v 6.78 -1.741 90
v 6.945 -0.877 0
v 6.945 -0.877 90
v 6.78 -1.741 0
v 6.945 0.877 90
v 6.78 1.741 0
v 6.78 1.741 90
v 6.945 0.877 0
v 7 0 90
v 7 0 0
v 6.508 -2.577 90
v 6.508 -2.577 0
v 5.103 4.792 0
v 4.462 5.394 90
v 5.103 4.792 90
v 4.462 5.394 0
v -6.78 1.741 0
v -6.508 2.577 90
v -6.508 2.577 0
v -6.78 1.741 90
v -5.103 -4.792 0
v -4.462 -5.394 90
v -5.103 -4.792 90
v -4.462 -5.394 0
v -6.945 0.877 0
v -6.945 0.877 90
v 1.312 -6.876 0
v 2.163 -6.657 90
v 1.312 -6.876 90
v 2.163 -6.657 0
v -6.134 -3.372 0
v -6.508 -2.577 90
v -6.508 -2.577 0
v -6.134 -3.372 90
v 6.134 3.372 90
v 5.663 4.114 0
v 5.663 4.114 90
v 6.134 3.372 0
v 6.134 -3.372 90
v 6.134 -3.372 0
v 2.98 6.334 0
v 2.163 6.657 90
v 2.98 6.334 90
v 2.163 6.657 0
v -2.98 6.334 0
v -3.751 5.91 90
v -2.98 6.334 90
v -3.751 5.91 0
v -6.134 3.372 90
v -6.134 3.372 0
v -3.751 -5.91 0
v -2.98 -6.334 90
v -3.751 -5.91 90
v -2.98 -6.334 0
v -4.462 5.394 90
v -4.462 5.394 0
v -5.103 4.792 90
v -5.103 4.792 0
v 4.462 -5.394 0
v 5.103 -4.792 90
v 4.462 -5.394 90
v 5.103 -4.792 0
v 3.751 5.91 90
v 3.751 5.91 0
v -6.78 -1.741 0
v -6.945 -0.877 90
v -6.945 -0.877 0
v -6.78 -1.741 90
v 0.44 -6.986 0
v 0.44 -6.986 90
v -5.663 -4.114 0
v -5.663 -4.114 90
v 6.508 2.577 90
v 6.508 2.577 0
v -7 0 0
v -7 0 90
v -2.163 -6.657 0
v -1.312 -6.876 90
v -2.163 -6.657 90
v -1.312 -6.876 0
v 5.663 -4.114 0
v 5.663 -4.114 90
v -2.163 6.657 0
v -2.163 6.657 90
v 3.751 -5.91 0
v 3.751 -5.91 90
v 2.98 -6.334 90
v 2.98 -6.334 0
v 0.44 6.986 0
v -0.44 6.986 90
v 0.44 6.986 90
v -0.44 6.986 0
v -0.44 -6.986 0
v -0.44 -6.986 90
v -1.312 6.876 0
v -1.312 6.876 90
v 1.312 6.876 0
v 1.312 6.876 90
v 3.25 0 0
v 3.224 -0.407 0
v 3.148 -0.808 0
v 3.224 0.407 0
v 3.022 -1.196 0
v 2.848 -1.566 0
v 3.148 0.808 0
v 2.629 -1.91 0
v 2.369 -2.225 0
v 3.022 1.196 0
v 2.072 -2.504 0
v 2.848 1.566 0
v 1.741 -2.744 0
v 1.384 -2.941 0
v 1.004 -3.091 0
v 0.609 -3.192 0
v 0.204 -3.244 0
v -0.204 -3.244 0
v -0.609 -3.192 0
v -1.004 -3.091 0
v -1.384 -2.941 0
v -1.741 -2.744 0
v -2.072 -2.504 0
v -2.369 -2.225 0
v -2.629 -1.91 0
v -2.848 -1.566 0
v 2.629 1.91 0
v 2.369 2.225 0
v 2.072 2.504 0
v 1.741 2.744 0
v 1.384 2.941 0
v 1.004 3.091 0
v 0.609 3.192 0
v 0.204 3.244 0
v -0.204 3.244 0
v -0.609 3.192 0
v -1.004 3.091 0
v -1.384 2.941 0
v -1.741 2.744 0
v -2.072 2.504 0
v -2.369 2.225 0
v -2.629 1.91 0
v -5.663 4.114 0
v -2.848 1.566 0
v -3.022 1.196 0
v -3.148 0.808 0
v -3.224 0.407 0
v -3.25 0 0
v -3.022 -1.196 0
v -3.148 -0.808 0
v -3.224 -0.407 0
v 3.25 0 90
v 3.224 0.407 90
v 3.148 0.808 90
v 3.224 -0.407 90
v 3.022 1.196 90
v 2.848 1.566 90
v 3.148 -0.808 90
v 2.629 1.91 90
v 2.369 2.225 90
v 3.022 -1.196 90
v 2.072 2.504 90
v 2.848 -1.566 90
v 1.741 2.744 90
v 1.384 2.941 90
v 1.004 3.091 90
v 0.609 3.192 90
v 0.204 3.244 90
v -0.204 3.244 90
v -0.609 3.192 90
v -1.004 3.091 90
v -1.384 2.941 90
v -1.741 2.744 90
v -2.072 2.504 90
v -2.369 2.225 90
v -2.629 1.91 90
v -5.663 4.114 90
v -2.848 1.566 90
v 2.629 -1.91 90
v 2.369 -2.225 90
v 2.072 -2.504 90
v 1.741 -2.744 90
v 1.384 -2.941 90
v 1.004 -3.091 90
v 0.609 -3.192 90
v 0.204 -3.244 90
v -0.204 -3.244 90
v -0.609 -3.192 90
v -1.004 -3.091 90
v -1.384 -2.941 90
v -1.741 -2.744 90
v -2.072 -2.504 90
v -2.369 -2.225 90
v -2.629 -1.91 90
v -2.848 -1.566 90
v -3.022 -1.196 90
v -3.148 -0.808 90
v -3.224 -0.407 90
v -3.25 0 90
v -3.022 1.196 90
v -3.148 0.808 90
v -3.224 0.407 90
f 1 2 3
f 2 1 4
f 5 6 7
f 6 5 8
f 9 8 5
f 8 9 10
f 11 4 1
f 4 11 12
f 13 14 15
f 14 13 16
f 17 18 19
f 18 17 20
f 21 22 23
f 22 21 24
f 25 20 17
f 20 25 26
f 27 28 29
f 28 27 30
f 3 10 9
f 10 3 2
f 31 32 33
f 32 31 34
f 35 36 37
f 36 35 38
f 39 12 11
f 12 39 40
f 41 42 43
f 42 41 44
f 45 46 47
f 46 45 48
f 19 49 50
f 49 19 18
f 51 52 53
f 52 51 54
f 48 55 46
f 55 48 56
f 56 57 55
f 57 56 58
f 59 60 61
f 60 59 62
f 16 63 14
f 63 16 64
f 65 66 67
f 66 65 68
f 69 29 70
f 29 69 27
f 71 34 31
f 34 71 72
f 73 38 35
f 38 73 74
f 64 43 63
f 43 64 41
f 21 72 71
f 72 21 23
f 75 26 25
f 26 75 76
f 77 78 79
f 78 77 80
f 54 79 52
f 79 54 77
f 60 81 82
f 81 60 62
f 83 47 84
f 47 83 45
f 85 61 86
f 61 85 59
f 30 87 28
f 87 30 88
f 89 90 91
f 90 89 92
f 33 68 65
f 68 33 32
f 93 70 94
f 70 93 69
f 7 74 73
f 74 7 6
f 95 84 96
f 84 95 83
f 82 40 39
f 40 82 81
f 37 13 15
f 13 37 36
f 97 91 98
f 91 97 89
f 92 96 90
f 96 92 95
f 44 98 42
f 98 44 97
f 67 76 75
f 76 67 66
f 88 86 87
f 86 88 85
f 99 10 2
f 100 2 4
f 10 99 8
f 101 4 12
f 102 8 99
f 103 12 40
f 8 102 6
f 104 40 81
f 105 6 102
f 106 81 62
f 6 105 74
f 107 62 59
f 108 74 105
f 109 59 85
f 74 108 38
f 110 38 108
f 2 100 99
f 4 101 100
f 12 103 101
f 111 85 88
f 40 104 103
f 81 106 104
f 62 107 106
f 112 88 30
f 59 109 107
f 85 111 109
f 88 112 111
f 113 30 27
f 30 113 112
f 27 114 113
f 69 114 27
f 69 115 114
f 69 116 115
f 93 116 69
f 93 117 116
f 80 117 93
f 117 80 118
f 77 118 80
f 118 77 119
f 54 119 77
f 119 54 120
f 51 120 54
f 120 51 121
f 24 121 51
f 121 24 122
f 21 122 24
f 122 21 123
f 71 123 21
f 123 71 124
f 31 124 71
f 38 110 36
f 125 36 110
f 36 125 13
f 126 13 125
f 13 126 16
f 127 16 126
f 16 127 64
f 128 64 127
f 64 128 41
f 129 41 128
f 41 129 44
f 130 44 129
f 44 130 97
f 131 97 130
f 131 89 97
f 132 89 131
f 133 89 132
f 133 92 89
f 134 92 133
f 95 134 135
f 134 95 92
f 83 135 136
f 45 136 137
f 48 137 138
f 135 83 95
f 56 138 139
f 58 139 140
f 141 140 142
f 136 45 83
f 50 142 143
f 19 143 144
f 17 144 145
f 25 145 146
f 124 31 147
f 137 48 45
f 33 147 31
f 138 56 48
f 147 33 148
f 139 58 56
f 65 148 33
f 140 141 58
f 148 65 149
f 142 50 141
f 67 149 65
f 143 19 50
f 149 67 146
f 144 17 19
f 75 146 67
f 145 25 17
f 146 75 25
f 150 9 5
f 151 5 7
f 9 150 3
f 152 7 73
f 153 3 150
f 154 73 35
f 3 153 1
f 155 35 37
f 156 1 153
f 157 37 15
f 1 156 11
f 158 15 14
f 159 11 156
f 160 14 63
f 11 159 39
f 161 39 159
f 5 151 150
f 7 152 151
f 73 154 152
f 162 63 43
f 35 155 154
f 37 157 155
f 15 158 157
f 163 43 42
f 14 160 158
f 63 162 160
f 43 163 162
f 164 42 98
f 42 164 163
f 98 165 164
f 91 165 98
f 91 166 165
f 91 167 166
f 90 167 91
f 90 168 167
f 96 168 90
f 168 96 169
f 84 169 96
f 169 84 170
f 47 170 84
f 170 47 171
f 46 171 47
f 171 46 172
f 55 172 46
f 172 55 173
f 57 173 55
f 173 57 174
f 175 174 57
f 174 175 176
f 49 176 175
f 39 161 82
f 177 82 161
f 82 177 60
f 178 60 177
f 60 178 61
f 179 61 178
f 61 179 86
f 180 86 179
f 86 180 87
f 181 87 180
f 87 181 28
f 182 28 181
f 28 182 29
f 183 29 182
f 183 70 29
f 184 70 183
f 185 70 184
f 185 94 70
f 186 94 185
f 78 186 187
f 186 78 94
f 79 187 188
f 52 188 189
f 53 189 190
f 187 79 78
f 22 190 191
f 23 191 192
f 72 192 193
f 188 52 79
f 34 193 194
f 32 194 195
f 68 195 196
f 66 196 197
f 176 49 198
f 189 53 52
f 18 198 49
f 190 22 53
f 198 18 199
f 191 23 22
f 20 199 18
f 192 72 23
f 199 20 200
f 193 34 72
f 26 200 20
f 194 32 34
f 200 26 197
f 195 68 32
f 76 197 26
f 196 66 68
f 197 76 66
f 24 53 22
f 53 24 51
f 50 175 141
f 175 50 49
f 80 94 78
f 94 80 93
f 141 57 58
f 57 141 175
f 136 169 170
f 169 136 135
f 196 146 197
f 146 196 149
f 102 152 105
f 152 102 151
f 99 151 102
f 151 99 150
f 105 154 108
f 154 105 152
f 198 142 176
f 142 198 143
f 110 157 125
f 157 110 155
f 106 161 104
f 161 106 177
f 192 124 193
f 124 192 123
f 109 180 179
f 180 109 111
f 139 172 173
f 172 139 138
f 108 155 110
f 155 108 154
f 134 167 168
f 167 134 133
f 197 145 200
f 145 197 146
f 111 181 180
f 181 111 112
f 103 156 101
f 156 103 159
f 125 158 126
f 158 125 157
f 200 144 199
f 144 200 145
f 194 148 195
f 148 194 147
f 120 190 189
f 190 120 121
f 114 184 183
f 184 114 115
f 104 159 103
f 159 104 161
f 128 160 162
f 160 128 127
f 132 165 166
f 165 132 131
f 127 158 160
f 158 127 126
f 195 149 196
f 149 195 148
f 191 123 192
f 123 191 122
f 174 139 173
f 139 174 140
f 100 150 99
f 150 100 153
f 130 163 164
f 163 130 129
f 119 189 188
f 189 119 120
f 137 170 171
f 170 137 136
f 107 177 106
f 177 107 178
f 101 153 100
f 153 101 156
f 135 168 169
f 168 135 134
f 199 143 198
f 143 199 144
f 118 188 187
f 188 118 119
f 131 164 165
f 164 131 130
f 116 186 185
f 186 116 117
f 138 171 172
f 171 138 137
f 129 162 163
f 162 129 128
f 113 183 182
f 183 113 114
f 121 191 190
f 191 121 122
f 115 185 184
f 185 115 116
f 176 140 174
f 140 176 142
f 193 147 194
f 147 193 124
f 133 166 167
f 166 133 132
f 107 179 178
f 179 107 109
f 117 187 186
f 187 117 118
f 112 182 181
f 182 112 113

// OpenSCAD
$fn = 50;


difference() {
	union() {
		cylinder(h = 90, r = 7.0000000000);
	}
	union() {
		translate(v = [0.0000000000, 0.0000000000, -100.0000000000]) {
			cylinder(h = 200, r = 3.2500000000);
		}
	}
}
